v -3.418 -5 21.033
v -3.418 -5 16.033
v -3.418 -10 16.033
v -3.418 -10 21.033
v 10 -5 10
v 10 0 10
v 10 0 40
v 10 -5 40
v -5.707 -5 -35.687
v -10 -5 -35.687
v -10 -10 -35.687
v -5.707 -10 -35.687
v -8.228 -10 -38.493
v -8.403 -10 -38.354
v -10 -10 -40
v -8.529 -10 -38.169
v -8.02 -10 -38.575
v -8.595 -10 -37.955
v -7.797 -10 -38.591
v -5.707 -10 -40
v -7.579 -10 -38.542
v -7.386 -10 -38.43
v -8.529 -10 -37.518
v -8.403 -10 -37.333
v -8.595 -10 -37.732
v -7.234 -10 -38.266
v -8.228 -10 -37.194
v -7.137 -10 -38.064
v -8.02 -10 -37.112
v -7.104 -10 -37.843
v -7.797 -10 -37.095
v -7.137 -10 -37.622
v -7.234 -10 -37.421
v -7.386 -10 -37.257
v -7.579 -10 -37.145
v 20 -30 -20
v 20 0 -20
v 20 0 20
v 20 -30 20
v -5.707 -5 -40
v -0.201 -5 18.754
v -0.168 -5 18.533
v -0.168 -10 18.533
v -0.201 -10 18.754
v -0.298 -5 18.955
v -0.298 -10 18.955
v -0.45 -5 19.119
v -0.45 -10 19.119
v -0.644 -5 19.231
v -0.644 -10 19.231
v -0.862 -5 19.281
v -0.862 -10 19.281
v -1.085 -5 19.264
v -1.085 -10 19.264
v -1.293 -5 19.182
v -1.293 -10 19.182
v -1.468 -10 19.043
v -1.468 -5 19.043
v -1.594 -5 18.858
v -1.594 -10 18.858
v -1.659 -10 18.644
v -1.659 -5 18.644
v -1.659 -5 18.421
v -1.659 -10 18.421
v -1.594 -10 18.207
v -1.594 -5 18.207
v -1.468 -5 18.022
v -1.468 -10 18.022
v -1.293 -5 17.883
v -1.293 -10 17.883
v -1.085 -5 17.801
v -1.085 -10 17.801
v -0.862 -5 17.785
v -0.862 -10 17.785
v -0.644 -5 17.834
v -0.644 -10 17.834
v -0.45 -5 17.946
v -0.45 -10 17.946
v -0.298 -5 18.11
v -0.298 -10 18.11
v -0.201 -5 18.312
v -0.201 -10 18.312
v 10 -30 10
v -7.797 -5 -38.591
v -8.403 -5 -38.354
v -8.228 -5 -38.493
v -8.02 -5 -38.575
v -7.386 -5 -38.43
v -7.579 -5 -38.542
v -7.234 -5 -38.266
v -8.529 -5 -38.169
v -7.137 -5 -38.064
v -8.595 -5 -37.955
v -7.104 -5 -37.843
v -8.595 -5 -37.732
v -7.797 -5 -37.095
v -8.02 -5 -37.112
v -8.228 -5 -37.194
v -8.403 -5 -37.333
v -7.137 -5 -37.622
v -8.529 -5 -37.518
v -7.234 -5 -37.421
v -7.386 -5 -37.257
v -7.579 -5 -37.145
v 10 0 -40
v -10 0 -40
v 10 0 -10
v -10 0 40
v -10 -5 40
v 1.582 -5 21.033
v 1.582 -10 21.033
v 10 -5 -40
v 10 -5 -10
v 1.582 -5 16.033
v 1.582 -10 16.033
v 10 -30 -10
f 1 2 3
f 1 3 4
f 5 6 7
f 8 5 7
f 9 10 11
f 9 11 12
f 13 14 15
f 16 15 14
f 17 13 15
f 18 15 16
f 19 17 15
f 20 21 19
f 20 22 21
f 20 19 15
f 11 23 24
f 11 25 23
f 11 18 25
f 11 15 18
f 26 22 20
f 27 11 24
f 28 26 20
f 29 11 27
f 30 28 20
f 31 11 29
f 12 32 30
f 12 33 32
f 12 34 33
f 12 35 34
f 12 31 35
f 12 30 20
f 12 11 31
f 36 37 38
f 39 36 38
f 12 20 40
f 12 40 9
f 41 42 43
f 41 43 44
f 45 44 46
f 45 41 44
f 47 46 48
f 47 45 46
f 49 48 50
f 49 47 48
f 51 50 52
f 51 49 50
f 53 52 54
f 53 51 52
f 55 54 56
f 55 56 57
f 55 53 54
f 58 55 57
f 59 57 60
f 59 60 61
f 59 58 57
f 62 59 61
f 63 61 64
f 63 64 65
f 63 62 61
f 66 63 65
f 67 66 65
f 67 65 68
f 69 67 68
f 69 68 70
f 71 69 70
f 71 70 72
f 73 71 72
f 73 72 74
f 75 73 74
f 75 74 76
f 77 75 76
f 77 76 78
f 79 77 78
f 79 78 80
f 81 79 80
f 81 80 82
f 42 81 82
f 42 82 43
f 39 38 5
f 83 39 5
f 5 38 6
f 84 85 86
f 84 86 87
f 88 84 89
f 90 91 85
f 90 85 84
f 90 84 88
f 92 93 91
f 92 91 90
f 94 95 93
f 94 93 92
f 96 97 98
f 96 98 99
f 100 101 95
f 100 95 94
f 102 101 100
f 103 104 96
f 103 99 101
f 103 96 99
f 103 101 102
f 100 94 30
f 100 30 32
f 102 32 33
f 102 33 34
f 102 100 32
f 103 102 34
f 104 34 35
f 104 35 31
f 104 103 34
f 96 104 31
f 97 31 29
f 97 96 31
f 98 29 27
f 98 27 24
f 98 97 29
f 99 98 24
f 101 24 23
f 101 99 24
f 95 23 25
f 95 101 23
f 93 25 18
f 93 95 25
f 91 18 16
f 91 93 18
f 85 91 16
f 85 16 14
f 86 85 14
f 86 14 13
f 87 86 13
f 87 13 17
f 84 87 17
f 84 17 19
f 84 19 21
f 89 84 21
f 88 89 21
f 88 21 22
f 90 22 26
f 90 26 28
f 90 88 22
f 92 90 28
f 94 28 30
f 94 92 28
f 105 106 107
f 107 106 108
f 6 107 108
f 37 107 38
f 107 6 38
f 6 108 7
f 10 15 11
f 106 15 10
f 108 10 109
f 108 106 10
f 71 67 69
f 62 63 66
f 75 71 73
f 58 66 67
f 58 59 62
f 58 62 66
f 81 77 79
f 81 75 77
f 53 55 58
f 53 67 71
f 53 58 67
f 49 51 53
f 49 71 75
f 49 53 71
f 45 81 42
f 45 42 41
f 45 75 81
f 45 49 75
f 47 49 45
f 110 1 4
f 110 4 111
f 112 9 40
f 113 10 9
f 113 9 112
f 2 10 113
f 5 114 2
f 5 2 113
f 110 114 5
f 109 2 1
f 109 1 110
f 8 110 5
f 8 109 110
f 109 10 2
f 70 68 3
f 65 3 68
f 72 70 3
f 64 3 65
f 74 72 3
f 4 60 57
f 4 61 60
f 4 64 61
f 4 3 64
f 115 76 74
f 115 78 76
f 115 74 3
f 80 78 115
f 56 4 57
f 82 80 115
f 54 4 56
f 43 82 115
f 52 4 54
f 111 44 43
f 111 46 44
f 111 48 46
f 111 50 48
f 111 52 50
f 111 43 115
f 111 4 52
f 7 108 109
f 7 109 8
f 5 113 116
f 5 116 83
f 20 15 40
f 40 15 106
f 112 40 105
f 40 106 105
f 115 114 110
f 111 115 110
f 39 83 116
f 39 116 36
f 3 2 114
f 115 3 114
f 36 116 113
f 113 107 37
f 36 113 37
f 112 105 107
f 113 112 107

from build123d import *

# Parameters (mm, degrees)
F0_W     = 20
F0_H     = 80
F1_DEPTH = 5
F3_W     = 5
F3_H     = 5
F3_R     = 0.75
F4_DEPTH = 10
F2_W     = 4.293
F2_H     = 4.31325
F2_R     = 0.75
F5_DEPTH = 5
F6_W     = 10
F6_H     = 20
F7_DEPTH = 30


with BuildPart() as f1:
    # F0 (on Front) → F1 (new body)
    with BuildSketch(Plane.XZ):
        Rectangle(F0_W, F0_H)
    extrude(amount=F1_DEPTH)

    # F3 (on Front) → F4 (join)
    with BuildSketch(Plane.XZ):
        with Locations((-0.917875, 18.532625)):
            Rectangle(F3_W, F3_H)
        with Locations((-0.917875, 18.532625)):
            Circle(F3_R, mode=Mode.SUBTRACT)
    extrude(amount=F4_DEPTH)

    # F2 (on face) → F5 (join)
    with BuildSketch(Plane.XZ.offset(5)):
        with Locations((-7.8535, -37.843375)):
            Rectangle(F2_W, F2_H)
        with Locations((-7.8535, -37.843375)):
            Circle(F2_R, mode=Mode.SUBTRACT)
    extrude(amount=F5_DEPTH)

    # F6 (on Front) → F7 (join)
    with BuildSketch(Plane.XZ):
        with Locations((15, 0)):
            Rectangle(F6_W, F6_H)
        Polygon((20, -10), (10, -10), (20, -20), align=None)
        Polygon((20, 20), (10, 10), (20, 10), align=None)
    extrude(amount=F7_DEPTH)


solid = f1.part
